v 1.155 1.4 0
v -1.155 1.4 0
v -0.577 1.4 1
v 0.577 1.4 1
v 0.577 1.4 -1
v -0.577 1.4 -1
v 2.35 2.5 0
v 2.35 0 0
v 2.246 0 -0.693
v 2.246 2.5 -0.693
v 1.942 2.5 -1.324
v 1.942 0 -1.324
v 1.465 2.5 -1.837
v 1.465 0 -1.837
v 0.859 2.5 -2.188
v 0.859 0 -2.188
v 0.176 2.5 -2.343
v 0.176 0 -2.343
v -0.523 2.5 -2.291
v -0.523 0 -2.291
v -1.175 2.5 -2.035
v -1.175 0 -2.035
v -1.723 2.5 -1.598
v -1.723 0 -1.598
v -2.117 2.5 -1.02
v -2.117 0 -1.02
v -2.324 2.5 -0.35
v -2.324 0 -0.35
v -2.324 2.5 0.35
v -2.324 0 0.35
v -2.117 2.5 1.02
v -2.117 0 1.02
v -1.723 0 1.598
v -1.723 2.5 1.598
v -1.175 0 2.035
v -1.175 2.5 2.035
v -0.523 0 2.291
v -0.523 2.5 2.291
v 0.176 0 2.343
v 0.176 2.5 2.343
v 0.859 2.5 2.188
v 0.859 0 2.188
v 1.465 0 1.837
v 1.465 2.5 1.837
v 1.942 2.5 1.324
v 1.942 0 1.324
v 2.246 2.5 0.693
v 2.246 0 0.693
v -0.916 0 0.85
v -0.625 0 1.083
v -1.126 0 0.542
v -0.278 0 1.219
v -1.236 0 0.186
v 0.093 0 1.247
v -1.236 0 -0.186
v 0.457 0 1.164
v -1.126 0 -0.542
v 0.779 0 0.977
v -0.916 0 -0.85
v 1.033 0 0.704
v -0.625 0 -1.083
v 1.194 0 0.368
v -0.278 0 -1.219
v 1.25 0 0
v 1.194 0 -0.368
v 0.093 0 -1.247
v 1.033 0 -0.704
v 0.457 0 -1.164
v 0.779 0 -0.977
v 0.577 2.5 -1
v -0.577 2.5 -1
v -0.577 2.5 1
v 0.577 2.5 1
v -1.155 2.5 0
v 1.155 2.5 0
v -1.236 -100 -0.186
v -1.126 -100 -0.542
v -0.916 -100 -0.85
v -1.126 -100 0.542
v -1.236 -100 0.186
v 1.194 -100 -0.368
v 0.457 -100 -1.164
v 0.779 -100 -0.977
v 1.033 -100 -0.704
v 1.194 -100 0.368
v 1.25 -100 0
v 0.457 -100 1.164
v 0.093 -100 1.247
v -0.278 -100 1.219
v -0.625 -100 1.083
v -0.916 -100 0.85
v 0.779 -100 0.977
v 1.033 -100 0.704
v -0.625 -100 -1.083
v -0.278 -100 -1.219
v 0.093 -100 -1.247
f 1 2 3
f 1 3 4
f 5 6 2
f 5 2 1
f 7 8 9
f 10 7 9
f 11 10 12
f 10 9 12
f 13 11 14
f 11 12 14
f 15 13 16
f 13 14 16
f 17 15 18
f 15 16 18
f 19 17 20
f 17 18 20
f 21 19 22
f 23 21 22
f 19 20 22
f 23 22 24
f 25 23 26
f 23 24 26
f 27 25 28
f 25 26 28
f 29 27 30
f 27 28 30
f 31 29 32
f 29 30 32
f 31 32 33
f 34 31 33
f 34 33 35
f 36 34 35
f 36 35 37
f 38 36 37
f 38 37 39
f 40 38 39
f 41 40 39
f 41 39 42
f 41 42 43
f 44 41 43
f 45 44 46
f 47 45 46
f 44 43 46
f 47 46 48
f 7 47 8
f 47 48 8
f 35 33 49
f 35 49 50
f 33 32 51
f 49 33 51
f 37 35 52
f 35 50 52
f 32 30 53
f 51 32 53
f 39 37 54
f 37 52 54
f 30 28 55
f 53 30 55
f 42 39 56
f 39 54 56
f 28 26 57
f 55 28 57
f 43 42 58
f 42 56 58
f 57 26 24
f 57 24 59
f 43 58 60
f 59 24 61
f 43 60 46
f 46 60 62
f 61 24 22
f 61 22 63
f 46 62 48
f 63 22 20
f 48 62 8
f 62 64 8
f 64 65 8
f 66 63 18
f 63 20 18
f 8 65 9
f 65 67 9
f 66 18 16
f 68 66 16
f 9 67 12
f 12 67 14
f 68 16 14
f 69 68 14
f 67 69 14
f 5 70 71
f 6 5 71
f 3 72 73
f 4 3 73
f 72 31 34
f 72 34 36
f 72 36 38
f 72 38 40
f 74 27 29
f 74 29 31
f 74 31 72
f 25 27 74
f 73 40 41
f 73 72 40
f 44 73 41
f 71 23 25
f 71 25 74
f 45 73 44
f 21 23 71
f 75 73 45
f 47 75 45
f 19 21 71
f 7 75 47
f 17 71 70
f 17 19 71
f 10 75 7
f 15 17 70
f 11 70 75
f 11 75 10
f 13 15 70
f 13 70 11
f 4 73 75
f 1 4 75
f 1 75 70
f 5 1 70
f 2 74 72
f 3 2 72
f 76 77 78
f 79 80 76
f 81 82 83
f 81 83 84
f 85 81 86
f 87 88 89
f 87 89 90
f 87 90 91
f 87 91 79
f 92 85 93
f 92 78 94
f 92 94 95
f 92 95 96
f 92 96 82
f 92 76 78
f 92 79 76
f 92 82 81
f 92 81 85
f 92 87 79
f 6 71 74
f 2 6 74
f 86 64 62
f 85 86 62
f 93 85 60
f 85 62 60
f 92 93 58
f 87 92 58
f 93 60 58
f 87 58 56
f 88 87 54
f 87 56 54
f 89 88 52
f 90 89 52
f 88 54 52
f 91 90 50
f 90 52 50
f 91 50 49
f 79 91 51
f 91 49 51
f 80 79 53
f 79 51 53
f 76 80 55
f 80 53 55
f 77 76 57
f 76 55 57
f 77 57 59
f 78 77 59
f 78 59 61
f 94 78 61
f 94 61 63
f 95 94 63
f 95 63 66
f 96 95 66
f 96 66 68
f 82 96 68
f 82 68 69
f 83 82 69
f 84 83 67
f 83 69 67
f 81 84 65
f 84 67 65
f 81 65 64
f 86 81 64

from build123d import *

# Parameters (mm, degrees)
SKETCH_1_R            = 2.35
EXTRUDE_248_DEPTH     = 2.5
CUT_EXTRUDE_382_DEPTH = 1.1
SKETCH_3_R            = 1.25
EXTRUDE_487_DEPTH     = 100


with BuildPart() as part:
    # 草图1 → Extrude 248 (new body)
    with BuildSketch(Plane(origin=(0, 0, 0), x_dir=(1, 0, 0), z_dir=(0, 1, 0))):
        Circle(SKETCH_1_R)
    extrude(amount=EXTRUDE_248_DEPTH)

    # 草图2 → Cut-Extrude 382 (cut)
    with BuildSketch(Plane(origin=(0, 2.5, 0), x_dir=(1, 0, 0), z_dir=(0, 1, 0))):
        Polygon((1.154700538, 0), (0.577350269, 1), (-0.577350269, 1), (-1.154700538, 0), (-0.577350269, -1), (0.577350269, -1), align=None)
    extrude(amount=-CUT_EXTRUDE_382_DEPTH, mode=Mode.SUBTRACT)

    # 草图3 → Extrude 487 (add)
    with BuildSketch(Plane.XZ):
        Circle(SKETCH_3_R)
    extrude(amount=EXTRUDE_487_DEPTH)


solid = part.part
